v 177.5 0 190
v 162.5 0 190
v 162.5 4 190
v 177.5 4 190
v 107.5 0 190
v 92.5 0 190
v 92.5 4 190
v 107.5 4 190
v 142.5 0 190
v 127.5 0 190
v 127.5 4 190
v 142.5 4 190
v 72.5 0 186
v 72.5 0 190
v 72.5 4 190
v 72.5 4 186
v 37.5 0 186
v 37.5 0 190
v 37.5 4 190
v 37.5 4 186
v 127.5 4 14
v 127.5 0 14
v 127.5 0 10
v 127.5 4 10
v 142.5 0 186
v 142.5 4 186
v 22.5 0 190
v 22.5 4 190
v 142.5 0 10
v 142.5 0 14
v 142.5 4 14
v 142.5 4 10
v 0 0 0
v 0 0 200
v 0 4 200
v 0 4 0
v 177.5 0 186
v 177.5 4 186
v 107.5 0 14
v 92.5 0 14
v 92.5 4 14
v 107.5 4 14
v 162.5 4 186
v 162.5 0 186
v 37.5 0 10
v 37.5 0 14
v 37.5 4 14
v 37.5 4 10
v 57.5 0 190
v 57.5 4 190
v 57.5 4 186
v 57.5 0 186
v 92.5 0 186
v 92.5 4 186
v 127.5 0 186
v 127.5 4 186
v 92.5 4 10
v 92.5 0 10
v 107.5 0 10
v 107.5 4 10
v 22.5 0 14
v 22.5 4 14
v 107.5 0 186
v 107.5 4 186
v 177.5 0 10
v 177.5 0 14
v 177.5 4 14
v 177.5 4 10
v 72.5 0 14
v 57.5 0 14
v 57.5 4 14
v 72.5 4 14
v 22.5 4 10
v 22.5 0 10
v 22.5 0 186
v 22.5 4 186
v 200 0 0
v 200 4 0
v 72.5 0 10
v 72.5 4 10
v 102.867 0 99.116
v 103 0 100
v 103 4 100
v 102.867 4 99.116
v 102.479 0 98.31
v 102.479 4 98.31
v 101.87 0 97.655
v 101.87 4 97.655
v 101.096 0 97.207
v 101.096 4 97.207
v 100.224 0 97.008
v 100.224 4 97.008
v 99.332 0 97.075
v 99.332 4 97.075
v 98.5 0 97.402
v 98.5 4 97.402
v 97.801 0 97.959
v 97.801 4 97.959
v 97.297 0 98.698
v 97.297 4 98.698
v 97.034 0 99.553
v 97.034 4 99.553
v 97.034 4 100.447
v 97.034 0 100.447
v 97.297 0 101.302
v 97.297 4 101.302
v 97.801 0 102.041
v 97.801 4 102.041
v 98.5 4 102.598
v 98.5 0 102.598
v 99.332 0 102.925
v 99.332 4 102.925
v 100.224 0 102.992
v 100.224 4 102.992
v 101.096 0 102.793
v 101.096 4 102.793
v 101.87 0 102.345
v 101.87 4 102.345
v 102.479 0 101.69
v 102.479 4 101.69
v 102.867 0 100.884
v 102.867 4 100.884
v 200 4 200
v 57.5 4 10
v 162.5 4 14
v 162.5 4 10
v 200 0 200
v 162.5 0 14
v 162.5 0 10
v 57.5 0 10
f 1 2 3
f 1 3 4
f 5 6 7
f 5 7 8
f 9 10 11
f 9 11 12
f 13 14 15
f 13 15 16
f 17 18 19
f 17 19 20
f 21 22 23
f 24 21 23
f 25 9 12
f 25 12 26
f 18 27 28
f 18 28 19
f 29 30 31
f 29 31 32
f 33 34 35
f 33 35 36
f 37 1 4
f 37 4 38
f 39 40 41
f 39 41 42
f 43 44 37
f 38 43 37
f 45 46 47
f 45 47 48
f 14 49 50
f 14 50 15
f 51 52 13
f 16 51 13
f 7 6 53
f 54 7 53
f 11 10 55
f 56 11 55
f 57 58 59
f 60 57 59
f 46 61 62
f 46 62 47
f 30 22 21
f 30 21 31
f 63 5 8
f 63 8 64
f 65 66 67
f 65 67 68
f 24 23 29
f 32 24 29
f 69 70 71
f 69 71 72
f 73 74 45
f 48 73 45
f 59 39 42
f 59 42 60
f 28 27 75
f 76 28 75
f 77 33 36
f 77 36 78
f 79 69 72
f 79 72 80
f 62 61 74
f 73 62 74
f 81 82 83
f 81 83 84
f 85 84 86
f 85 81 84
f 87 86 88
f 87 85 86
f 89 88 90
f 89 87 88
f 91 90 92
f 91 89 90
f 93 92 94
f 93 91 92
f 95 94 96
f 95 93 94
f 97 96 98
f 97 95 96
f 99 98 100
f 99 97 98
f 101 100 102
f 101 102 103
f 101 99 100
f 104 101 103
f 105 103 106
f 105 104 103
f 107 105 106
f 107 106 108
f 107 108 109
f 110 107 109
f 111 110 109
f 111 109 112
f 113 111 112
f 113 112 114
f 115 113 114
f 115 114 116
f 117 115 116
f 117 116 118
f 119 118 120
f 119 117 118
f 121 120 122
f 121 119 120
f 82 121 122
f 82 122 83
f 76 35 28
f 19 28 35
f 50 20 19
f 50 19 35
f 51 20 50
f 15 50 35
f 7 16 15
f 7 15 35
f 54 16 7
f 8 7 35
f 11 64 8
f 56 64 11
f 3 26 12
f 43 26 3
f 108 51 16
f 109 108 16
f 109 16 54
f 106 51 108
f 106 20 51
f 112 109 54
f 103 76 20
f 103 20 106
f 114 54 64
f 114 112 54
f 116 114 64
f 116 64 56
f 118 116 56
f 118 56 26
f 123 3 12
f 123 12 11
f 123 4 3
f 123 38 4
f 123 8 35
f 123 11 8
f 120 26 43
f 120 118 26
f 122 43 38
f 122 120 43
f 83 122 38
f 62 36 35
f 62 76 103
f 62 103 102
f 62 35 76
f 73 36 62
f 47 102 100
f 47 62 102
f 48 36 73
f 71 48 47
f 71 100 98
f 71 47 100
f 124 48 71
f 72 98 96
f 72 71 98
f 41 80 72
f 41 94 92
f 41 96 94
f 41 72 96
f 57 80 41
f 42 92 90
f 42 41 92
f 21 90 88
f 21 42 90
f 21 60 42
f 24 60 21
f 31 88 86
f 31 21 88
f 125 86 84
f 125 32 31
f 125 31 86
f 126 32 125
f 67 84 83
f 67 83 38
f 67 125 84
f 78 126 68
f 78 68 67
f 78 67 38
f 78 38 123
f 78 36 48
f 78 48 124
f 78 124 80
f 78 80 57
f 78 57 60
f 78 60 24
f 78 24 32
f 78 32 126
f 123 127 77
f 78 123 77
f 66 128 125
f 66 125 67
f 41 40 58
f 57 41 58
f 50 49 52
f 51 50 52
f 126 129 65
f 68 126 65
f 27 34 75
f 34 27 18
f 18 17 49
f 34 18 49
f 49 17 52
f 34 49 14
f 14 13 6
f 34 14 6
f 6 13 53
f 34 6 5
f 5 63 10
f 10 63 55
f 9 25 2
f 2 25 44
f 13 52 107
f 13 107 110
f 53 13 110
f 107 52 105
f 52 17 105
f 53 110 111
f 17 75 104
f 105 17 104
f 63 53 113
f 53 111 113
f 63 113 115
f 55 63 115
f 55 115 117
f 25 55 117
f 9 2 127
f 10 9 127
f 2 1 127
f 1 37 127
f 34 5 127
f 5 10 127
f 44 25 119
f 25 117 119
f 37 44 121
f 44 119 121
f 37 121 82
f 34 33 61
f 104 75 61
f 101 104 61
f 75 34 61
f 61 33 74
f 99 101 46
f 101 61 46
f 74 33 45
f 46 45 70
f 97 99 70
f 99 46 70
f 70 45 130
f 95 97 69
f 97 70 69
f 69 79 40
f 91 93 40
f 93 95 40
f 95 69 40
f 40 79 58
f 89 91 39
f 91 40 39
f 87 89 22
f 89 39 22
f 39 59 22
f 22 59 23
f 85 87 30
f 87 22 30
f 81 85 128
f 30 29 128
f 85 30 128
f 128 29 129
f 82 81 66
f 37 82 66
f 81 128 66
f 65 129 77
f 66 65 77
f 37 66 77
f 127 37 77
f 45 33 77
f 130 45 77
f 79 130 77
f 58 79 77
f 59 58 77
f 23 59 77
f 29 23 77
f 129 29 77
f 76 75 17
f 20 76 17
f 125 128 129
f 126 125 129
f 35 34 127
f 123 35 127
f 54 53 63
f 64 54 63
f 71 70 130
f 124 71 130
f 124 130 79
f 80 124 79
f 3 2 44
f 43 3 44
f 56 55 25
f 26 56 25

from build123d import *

# Parameters (mm, degrees)
SKETCH1_W           = 200
SKETCH1_H           = 200
SKETCH1_R           = 3
SKETCH1_W_2         = 15
SKETCH1_H_2         = 4
BOSS_EXTRUDE1_DEPTH = 4


with BuildPart() as part:
    # Sketch1 → Boss-Extrude1 (new body)
    with BuildSketch(Plane(origin=(0, 0, 0), x_dir=(1, 0, 0), z_dir=(0, 1, 0))):
        with Locations((100, -100)):
            Rectangle(SKETCH1_W, SKETCH1_H)
        with Locations((100, -100)):
            Circle(SKETCH1_R, mode=Mode.SUBTRACT)
        with Locations((30, -12)):
            Rectangle(SKETCH1_W_2, SKETCH1_H_2, mode=Mode.SUBTRACT)
        with Locations((65, -12)):
            Rectangle(SKETCH1_W_2, SKETCH1_H_2, mode=Mode.SUBTRACT)
        with Locations((100, -12)):
            Rectangle(SKETCH1_W_2, SKETCH1_H_2, mode=Mode.SUBTRACT)
        with Locations((135, -12)):
            Rectangle(SKETCH1_W_2, SKETCH1_H_2, mode=Mode.SUBTRACT)
        with Locations((170, -12)):
            Rectangle(SKETCH1_W_2, SKETCH1_H_2, mode=Mode.SUBTRACT)
        with Locations((170, -188)):
            Rectangle(SKETCH1_W_2, SKETCH1_H_2, mode=Mode.SUBTRACT)
        with Locations((135, -188)):
            Rectangle(SKETCH1_W_2, SKETCH1_H_2, mode=Mode.SUBTRACT)
        with Locations((100, -188)):
            Rectangle(SKETCH1_W_2, SKETCH1_H_2, mode=Mode.SUBTRACT)
        with Locations((65, -188)):
            Rectangle(SKETCH1_W_2, SKETCH1_H_2, mode=Mode.SUBTRACT)
        with Locations((30, -188)):
            Rectangle(SKETCH1_W_2, SKETCH1_H_2, mode=Mode.SUBTRACT)
    extrude(amount=BOSS_EXTRUDE1_DEPTH)


solid = part.part
